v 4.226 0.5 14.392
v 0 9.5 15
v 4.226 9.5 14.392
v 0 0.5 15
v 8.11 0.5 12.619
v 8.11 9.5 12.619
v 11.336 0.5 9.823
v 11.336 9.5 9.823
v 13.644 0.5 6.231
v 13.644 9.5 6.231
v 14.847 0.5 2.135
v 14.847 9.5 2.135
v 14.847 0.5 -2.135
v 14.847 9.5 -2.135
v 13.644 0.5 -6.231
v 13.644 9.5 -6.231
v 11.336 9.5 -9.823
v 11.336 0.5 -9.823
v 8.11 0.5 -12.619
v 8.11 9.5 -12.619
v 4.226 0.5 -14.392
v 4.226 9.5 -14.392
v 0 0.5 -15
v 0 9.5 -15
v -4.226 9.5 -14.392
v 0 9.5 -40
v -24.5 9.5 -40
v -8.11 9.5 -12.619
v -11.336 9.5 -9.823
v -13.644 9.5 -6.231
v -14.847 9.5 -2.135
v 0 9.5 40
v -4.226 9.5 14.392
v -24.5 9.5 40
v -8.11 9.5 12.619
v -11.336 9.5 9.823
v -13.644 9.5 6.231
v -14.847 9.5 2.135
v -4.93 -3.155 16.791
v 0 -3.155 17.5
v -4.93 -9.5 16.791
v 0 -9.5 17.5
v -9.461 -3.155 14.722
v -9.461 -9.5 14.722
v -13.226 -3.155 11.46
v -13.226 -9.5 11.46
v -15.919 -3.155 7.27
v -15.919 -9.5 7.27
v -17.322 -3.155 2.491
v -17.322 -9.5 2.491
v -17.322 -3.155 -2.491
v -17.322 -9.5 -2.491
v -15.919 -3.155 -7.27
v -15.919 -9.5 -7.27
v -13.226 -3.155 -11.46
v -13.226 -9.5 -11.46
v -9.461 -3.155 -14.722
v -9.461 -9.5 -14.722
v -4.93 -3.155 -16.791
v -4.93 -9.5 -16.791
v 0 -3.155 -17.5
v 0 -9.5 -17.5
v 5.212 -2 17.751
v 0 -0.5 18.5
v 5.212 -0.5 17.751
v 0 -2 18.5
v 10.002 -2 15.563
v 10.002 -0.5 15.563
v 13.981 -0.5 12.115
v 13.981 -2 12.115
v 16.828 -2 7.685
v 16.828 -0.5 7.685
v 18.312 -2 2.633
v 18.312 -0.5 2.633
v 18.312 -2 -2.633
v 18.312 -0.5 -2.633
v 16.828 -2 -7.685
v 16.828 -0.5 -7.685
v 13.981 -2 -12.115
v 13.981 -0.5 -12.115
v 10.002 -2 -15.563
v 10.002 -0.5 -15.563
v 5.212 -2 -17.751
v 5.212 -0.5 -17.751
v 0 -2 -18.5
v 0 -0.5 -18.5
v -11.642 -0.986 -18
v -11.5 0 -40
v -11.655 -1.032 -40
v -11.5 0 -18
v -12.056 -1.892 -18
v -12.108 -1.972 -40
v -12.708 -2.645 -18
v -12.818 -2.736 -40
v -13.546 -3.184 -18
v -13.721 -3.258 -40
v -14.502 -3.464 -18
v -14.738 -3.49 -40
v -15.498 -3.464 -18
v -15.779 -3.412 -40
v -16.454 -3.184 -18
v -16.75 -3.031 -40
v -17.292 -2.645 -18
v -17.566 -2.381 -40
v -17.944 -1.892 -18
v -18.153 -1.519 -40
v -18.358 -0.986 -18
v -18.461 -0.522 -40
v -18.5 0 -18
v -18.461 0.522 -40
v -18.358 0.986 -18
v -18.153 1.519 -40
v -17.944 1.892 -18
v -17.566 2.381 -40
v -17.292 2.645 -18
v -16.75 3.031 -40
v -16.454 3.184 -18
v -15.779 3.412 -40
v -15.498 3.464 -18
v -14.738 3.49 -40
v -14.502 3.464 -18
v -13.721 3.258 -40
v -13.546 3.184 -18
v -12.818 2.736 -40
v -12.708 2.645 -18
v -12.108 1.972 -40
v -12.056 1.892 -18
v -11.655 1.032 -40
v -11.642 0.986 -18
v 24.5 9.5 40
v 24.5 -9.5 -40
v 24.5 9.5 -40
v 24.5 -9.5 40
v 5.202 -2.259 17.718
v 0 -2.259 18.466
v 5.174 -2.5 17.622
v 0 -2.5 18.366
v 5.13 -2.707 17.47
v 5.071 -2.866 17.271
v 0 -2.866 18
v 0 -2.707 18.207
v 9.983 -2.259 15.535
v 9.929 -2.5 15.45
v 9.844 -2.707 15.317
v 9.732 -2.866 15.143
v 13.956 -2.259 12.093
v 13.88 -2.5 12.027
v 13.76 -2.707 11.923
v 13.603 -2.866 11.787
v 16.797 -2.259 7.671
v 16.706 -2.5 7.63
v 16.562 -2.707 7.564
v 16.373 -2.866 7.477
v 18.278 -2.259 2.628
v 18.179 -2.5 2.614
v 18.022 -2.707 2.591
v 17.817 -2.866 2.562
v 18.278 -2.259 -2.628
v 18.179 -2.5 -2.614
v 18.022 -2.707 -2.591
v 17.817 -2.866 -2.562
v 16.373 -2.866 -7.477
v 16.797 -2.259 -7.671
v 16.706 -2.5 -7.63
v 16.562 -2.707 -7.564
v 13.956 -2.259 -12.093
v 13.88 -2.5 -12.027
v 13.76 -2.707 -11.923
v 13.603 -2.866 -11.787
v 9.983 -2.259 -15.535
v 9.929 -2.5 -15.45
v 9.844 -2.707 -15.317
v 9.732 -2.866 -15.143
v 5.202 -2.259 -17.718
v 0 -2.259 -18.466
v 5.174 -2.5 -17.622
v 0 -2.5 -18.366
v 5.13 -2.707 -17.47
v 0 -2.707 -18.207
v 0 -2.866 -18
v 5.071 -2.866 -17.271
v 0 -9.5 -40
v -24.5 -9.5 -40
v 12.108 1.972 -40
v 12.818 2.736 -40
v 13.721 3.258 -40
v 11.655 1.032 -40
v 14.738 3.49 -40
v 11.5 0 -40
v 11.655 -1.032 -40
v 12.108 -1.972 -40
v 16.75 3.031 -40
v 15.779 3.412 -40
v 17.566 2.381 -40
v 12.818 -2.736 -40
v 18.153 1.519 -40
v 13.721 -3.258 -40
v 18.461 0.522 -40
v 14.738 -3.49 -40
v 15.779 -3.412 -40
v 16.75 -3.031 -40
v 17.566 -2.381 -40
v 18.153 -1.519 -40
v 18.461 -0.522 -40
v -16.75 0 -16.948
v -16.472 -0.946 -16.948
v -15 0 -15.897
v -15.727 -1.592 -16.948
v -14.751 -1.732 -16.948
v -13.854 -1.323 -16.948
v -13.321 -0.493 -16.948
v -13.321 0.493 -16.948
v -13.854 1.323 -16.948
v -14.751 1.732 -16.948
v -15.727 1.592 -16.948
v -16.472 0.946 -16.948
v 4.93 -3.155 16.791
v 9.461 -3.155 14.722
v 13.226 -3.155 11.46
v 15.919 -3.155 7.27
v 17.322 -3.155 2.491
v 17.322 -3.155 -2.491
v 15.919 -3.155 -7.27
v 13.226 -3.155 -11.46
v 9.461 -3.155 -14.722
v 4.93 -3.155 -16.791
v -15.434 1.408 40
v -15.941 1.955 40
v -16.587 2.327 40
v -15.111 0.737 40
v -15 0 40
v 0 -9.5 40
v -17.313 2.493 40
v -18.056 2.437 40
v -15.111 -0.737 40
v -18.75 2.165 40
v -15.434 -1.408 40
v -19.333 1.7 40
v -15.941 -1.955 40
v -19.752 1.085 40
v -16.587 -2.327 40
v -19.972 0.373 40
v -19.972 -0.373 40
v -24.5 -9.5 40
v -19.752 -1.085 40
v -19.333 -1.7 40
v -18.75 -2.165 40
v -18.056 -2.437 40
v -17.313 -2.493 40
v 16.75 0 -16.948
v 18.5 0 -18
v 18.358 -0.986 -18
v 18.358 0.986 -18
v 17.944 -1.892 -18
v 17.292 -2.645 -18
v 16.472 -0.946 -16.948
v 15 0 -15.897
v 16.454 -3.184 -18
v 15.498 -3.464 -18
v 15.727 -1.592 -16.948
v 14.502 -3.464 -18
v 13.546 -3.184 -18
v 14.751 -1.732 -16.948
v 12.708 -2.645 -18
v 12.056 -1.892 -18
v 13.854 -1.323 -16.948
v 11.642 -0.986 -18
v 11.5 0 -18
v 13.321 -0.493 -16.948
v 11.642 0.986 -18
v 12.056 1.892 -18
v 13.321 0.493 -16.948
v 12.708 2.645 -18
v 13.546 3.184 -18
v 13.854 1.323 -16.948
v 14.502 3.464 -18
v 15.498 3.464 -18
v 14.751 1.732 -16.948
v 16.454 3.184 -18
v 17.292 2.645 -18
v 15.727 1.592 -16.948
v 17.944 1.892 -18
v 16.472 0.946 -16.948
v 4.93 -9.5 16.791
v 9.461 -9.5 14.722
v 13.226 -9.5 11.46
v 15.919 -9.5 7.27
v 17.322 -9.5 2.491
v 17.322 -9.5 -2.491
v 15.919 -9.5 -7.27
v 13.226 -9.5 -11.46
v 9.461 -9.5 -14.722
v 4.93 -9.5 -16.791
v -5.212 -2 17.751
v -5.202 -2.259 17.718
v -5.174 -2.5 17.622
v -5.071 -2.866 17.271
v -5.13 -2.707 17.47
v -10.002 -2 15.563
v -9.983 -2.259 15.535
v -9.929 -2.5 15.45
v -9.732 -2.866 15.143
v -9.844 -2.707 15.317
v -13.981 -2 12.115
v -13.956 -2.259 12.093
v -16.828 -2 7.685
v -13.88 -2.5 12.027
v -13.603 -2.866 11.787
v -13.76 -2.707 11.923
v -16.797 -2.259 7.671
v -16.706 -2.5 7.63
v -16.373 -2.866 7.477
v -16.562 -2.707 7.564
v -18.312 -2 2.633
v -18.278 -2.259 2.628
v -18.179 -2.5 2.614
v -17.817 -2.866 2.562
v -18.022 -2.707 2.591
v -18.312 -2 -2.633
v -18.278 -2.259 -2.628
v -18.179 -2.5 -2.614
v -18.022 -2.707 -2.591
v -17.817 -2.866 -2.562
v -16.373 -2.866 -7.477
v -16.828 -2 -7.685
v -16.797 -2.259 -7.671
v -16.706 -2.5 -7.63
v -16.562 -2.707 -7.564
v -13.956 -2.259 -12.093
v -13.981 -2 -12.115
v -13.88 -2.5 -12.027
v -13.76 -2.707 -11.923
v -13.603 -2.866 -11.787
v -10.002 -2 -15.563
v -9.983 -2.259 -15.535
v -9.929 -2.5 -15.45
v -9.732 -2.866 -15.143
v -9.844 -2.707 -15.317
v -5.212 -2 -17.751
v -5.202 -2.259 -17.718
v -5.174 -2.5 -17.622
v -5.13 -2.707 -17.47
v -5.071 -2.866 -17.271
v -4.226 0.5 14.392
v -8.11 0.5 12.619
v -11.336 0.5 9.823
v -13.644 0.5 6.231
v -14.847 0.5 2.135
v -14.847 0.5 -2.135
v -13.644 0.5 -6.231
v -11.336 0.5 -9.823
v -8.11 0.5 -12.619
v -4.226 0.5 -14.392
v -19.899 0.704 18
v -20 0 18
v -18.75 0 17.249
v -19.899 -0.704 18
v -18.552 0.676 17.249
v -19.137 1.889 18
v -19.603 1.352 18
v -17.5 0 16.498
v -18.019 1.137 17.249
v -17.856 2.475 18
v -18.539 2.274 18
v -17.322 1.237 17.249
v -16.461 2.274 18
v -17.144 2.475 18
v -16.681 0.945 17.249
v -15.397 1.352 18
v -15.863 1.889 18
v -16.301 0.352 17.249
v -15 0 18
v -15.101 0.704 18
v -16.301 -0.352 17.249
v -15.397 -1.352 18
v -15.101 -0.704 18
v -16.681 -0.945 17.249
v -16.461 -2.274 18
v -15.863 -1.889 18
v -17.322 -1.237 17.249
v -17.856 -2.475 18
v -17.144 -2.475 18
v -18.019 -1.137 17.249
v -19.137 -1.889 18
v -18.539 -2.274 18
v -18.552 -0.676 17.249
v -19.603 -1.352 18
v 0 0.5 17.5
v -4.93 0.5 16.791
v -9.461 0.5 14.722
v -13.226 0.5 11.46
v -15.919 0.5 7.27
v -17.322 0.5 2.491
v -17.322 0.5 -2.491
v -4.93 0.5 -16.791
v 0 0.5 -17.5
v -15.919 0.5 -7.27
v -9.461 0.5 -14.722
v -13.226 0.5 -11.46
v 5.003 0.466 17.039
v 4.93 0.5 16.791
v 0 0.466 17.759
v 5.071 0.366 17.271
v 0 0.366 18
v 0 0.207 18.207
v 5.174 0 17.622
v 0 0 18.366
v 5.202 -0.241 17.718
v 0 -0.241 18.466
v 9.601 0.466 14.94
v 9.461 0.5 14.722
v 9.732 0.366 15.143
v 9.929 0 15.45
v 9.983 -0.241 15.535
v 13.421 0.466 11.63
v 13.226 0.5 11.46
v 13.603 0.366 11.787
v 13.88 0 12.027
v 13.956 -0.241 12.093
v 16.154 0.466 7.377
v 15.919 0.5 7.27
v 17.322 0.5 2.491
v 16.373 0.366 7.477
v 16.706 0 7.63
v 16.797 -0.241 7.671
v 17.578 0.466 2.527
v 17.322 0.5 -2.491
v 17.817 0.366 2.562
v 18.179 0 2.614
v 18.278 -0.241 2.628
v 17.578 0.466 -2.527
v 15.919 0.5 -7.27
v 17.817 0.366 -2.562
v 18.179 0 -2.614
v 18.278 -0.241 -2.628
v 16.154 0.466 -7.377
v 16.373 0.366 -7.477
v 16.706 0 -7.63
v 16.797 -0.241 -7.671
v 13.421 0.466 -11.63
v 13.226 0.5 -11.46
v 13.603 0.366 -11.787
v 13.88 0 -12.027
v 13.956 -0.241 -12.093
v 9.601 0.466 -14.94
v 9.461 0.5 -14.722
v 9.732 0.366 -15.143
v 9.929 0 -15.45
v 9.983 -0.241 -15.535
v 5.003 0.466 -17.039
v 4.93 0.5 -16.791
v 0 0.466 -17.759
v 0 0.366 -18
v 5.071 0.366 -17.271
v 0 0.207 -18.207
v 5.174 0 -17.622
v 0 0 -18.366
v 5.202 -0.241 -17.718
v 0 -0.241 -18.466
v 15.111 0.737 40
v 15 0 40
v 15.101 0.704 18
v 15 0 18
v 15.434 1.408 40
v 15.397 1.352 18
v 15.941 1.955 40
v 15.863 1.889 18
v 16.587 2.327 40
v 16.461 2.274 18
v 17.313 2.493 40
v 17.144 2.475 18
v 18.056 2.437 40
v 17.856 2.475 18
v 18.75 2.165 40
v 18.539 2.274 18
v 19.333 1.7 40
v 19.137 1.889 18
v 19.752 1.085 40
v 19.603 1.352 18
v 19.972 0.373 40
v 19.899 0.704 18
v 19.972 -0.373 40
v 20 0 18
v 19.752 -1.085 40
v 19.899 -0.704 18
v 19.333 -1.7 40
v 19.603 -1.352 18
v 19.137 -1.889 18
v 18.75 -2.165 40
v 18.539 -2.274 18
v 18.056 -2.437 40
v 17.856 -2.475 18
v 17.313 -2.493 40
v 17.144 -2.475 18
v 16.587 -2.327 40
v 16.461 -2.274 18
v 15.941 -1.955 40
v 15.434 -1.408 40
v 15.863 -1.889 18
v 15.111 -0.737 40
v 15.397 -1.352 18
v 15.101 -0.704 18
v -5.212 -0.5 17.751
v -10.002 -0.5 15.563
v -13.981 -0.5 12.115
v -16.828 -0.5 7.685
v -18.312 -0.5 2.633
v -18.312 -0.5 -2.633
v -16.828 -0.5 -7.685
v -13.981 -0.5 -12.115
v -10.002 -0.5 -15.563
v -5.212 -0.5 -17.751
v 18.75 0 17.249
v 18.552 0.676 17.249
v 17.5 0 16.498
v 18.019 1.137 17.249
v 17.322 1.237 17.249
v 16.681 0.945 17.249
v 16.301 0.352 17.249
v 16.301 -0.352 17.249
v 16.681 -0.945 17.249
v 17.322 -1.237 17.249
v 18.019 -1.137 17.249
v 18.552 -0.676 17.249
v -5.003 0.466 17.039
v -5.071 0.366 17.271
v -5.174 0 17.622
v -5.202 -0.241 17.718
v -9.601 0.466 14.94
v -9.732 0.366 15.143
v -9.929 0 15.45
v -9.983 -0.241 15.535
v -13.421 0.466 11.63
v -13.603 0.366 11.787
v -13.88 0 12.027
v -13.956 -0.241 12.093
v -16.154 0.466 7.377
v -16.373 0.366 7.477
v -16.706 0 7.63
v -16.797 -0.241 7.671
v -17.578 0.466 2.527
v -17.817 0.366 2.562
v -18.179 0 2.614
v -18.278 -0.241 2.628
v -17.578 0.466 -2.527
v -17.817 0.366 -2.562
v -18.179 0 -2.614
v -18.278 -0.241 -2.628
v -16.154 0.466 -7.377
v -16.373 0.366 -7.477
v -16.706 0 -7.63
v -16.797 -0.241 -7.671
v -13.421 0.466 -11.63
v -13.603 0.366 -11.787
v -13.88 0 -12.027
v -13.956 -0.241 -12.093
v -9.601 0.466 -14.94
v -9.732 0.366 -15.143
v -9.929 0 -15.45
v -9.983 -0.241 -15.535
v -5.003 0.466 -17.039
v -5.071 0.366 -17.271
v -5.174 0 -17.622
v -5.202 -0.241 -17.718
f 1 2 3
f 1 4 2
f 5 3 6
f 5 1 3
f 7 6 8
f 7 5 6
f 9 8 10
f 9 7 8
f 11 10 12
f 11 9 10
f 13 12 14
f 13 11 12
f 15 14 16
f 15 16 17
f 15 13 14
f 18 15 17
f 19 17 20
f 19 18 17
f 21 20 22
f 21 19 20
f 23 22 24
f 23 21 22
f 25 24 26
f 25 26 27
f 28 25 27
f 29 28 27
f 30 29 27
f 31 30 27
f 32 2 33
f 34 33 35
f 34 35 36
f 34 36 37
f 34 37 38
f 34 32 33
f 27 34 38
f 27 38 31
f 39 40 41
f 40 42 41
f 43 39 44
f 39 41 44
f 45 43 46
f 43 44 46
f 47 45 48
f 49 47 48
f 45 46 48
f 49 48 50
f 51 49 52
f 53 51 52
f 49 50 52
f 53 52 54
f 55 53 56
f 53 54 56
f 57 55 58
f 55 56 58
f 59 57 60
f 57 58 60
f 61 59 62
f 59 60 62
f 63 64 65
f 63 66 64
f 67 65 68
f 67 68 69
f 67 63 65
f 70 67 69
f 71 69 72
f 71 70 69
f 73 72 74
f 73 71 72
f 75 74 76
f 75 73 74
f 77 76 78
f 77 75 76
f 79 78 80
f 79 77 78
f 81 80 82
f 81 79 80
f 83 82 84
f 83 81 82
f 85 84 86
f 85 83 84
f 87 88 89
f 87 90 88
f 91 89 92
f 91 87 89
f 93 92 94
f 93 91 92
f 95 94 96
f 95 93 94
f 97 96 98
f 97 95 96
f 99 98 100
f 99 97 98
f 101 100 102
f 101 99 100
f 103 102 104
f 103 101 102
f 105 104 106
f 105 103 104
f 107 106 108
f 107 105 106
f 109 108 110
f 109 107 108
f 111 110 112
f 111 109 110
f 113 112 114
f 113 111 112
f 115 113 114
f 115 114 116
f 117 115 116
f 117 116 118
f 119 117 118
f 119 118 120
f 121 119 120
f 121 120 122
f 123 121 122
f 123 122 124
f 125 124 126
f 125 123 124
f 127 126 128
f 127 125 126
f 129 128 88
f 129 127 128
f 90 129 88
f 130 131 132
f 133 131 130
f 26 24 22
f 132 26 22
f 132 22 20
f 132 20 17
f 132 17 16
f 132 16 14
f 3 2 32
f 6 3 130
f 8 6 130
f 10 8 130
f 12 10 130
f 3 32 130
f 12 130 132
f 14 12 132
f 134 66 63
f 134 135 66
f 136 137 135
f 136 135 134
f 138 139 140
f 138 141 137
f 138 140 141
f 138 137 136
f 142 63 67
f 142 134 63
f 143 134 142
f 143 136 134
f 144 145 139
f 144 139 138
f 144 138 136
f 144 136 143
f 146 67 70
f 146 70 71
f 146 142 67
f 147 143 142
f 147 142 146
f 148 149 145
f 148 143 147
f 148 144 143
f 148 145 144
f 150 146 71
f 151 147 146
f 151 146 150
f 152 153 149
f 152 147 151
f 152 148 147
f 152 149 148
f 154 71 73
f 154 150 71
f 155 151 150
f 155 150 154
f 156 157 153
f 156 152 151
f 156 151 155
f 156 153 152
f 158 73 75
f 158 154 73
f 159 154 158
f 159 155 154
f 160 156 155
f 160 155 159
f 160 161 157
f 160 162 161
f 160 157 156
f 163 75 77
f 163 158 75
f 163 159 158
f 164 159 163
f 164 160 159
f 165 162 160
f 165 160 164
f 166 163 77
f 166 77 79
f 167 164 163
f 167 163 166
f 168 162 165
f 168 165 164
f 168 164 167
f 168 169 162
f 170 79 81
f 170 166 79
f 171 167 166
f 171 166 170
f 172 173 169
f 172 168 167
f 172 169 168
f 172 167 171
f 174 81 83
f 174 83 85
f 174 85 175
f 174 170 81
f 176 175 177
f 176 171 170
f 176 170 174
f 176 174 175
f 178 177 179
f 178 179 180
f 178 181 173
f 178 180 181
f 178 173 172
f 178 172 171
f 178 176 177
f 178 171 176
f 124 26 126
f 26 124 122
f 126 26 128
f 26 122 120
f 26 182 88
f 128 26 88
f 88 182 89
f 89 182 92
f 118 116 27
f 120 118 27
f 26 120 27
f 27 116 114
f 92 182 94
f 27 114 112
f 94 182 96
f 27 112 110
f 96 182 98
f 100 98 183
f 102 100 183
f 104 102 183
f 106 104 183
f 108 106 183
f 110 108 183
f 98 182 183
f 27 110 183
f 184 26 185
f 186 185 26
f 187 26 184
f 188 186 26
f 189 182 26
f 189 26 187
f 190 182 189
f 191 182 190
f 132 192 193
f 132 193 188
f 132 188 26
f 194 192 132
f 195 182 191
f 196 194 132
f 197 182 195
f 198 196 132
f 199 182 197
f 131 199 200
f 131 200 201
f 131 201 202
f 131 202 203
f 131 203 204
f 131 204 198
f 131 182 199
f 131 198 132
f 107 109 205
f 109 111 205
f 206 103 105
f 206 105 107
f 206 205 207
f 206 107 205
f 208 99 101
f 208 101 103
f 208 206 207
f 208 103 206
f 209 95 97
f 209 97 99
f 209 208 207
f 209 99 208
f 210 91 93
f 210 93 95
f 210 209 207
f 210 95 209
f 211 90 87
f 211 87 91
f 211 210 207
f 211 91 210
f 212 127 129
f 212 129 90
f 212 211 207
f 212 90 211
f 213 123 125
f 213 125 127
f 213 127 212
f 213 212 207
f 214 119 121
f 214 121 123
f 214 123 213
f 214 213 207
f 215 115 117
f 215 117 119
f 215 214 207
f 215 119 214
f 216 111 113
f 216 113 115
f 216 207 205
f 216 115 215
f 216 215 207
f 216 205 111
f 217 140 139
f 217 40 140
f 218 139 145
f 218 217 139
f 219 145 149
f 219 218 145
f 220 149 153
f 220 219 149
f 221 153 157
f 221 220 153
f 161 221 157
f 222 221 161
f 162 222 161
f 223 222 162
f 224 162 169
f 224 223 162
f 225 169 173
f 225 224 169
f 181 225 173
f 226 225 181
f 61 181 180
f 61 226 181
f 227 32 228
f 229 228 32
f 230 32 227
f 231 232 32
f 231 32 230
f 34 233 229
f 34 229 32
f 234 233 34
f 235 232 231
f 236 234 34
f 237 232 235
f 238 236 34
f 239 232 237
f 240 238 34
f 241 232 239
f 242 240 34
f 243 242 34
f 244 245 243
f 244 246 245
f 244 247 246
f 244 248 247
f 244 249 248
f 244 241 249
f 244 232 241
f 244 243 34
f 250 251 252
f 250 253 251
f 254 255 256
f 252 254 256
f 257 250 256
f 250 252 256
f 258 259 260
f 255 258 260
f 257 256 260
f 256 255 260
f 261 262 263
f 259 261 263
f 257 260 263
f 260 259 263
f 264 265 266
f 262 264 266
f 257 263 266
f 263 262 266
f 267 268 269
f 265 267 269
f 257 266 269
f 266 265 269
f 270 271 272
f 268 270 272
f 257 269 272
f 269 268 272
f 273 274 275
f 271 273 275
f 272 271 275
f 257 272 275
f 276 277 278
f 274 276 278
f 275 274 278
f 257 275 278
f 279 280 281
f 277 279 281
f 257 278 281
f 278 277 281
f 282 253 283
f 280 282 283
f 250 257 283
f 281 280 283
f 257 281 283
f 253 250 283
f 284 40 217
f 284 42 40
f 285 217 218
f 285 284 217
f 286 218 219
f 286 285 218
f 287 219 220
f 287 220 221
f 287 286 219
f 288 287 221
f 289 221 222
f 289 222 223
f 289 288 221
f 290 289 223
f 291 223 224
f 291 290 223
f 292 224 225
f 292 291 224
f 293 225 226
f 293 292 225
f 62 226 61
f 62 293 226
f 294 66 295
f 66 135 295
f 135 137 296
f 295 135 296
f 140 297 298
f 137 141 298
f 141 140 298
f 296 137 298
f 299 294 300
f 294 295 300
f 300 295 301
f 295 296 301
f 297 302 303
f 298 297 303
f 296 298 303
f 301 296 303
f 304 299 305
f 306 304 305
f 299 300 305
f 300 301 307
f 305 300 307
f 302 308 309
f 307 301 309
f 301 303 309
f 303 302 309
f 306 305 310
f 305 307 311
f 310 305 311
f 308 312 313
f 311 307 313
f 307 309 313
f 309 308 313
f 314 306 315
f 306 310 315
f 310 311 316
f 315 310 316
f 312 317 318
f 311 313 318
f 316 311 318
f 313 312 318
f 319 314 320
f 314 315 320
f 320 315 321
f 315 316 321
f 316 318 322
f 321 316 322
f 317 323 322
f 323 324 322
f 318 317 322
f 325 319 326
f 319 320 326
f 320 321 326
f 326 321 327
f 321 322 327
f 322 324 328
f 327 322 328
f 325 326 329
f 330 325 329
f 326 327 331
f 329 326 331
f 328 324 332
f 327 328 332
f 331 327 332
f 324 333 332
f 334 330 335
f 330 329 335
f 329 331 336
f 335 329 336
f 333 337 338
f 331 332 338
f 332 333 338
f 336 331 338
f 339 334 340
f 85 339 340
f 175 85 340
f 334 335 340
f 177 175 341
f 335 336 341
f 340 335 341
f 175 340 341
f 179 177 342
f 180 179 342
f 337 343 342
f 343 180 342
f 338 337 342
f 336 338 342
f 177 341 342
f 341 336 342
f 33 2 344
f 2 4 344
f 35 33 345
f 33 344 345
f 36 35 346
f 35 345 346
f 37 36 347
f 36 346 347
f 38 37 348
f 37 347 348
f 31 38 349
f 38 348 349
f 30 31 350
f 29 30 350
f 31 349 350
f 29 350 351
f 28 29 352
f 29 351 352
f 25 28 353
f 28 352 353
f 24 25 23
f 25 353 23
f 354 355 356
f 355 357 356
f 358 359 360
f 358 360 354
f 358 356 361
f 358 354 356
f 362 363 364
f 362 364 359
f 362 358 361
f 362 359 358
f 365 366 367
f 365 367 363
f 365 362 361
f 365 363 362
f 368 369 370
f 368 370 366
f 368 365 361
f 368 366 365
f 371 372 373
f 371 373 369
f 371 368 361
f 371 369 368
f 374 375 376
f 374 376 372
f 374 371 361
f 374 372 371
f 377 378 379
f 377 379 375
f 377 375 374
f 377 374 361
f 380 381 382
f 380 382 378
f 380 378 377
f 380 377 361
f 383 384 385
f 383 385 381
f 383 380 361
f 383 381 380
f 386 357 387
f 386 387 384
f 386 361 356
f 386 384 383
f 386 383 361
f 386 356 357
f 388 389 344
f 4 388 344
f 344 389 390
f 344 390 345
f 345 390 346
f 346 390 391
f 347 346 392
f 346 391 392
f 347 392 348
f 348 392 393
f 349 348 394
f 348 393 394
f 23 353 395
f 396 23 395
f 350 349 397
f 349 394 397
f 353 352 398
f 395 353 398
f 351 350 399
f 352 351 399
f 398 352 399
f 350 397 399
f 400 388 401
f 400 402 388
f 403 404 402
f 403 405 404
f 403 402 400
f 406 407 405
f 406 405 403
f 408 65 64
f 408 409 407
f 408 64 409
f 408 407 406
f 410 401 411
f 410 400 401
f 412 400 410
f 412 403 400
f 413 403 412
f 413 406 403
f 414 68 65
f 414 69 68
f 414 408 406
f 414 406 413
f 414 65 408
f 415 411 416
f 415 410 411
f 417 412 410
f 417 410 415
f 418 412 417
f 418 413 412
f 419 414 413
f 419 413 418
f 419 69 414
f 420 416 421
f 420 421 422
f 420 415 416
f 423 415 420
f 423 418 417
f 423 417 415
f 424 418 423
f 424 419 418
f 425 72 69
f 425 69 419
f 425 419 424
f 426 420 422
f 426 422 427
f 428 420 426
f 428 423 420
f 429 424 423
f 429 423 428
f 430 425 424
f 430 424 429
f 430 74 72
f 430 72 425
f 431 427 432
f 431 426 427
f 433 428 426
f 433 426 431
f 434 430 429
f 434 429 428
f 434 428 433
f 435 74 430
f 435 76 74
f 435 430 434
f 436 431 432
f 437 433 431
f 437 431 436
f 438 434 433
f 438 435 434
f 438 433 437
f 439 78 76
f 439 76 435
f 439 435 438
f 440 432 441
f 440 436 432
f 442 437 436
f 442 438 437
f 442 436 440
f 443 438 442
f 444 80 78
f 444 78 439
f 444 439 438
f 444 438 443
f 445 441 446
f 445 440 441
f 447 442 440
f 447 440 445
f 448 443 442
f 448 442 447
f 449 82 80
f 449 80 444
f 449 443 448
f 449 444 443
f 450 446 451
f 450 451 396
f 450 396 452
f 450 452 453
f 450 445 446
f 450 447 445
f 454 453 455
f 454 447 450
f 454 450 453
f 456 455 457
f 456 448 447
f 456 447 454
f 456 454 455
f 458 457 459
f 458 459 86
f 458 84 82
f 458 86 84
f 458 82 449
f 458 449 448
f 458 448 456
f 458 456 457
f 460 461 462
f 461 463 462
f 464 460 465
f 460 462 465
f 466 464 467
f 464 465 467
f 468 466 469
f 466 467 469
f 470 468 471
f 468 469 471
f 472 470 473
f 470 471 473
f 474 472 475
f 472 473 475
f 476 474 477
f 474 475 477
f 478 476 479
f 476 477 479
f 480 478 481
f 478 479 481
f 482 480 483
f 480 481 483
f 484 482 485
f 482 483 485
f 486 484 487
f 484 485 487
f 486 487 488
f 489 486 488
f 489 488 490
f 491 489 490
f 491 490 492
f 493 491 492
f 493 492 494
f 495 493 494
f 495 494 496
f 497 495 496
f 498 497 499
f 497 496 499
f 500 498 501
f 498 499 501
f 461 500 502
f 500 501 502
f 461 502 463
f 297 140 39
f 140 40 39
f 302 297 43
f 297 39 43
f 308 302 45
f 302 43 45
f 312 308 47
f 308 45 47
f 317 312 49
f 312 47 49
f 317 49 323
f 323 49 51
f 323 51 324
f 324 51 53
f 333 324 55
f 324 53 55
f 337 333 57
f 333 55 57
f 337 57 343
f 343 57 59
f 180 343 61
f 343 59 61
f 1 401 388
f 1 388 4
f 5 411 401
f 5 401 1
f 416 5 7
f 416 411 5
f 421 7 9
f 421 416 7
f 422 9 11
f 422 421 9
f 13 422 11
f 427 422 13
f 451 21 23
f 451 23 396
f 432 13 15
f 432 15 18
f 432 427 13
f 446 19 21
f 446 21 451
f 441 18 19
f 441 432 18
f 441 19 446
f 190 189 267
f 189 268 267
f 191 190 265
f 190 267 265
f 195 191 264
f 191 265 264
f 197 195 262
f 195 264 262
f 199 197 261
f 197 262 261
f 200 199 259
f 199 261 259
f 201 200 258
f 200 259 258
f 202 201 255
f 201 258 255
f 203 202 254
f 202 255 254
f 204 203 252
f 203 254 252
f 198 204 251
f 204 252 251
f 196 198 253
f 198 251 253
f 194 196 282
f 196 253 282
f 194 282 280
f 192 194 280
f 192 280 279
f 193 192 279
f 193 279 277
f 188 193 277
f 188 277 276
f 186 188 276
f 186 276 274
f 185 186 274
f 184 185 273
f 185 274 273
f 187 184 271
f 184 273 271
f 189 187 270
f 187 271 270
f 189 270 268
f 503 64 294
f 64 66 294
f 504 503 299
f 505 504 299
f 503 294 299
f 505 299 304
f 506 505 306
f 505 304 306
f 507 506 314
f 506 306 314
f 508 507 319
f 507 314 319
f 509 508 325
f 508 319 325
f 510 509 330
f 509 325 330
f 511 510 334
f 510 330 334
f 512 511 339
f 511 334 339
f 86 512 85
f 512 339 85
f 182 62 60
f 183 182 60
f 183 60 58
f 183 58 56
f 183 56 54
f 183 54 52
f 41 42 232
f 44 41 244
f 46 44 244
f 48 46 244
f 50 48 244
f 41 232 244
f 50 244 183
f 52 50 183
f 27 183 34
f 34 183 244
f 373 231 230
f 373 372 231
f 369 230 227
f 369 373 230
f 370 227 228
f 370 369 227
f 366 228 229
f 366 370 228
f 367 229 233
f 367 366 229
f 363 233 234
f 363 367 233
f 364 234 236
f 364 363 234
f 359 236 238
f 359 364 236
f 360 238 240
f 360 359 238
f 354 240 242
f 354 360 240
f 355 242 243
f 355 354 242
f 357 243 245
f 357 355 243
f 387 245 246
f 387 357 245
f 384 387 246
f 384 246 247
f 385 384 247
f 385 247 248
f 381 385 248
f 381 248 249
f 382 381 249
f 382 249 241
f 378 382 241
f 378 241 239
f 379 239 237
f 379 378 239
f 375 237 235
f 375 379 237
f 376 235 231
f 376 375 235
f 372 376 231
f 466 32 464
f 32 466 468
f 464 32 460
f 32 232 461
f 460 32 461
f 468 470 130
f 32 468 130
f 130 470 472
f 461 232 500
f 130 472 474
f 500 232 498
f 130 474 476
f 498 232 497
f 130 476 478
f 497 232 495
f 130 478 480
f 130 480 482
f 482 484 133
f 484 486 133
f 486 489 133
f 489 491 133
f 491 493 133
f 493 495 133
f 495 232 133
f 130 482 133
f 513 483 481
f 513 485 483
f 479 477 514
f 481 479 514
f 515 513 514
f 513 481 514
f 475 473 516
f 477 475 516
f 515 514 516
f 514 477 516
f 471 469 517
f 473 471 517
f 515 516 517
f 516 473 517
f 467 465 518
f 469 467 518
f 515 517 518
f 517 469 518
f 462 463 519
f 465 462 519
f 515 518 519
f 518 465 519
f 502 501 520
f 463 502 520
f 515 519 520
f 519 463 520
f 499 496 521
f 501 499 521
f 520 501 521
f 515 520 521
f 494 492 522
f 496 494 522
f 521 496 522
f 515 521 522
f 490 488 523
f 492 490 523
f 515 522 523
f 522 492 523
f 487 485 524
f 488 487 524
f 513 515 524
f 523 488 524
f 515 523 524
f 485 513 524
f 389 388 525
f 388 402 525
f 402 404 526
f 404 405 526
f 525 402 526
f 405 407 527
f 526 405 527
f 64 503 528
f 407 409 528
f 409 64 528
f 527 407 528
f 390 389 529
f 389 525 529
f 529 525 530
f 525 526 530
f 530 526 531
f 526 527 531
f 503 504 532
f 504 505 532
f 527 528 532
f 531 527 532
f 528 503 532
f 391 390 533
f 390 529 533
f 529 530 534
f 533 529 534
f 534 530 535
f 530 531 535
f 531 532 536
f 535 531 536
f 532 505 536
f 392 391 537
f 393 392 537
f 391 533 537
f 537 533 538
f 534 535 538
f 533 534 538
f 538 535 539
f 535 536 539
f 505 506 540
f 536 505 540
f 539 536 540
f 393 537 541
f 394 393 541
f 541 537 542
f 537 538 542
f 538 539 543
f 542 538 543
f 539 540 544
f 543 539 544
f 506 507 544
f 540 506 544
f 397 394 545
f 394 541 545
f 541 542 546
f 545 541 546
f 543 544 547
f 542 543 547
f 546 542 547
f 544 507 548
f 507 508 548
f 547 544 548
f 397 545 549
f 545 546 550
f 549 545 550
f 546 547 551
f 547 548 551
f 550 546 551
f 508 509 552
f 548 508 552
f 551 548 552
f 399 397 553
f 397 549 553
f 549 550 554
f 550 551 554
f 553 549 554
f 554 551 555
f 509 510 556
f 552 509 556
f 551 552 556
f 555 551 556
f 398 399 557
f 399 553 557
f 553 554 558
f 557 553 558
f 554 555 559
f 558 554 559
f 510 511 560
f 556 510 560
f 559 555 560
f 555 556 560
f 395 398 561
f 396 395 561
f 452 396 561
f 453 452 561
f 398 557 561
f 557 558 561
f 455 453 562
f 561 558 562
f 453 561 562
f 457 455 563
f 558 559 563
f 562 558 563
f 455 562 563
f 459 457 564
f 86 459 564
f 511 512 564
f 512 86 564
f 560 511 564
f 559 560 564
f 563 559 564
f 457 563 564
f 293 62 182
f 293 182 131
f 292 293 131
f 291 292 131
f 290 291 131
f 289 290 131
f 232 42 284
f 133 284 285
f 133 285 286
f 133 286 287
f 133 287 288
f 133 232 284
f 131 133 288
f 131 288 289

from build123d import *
from build123d import SkipClean  # not in build123d's __all__

# Parameters (mm, degrees)
F0_W     = 24.5
F0_H     = 80
F1_DEPTH = 9.5
F3_D     = 5
F3_DEPTH = 22
F3_TIP   = 1.5021515476
F5_D     = 7
F5_DEPTH = 22
F5_TIP   = 2.1030121666
F7_ANGLE = 180


with BuildPart() as f1:
    # F0 (on Front) → F1 (new body, symmetric)
    with BuildSketch(Plane.XZ):
        with Locations((12.25, 0)):
            Rectangle(F0_W, F0_H)
    extrude(amount=F1_DEPTH, both=True)

    # F3
    with Locations(Plane.XY.offset(40)):
        with Locations((17.5, 0)):
            Hole(F3_D / 2, depth=F3_DEPTH)
            with Locations((0, 0, -(F3_DEPTH + F3_TIP / 2))):  # 118° drill point
                Cone(0, F3_D / 2, F3_TIP, mode=Mode.SUBTRACT)

    # F5
    with Locations(Plane(origin=(0, 0, -40), x_dir=(1, 0, 0), z_dir=(0, 0, -1))):
        with Locations((15, 0)):
            Hole(F5_D / 2, depth=F5_DEPTH)
            with Locations((0, 0, -(F5_DEPTH + F5_TIP / 2))):  # 118° drill point
                Cone(0, F5_D / 2, F5_TIP, mode=Mode.SUBTRACT)

    # F6 (on Right) → F7 (revolve, cut)
    with BuildSketch(Plane.YZ):
        with BuildLine():
            Line((-9.5, 0), (9.5, 0))
            Line((9.5, 0), (9.5, 15))
            Line((9.5, 15), (0.5, 15))
            Line((0.5, 15), (0.5, 17.5))
            ThreePointArc((0.5, 17.5), (0.2071067812, 18.2071067812), (-0.5, 18.5))
            Line((-0.5, 18.5), (-2, 18.5))
            ThreePointArc((-2, 18.5), (-2.5, 18.3660254038), (-2.8660254038, 18))
            Line((-2.8660254038, 18), (-3.1547005384, 17.5))
            Line((-3.1547005384, 17.5), (-9.5, 17.5))
            Line((-9.5, 17.5), (-9.5, 0))
        make_face()
    revolve(axis=Axis((0, 0, 0), (0, 1, 0)), revolution_arc=F7_ANGLE, mode=Mode.SUBTRACT)

    # F8: F1 across plane


with BuildPart() as f1_1:
    add(f1.part, clean=False)
    with SkipClean():  # cleaning this boolean's faces spoils the solid; the shape is the same uncleaned
        add(f1.part.mirror(Plane.YZ), clean=False)


solid = f1_1.part
